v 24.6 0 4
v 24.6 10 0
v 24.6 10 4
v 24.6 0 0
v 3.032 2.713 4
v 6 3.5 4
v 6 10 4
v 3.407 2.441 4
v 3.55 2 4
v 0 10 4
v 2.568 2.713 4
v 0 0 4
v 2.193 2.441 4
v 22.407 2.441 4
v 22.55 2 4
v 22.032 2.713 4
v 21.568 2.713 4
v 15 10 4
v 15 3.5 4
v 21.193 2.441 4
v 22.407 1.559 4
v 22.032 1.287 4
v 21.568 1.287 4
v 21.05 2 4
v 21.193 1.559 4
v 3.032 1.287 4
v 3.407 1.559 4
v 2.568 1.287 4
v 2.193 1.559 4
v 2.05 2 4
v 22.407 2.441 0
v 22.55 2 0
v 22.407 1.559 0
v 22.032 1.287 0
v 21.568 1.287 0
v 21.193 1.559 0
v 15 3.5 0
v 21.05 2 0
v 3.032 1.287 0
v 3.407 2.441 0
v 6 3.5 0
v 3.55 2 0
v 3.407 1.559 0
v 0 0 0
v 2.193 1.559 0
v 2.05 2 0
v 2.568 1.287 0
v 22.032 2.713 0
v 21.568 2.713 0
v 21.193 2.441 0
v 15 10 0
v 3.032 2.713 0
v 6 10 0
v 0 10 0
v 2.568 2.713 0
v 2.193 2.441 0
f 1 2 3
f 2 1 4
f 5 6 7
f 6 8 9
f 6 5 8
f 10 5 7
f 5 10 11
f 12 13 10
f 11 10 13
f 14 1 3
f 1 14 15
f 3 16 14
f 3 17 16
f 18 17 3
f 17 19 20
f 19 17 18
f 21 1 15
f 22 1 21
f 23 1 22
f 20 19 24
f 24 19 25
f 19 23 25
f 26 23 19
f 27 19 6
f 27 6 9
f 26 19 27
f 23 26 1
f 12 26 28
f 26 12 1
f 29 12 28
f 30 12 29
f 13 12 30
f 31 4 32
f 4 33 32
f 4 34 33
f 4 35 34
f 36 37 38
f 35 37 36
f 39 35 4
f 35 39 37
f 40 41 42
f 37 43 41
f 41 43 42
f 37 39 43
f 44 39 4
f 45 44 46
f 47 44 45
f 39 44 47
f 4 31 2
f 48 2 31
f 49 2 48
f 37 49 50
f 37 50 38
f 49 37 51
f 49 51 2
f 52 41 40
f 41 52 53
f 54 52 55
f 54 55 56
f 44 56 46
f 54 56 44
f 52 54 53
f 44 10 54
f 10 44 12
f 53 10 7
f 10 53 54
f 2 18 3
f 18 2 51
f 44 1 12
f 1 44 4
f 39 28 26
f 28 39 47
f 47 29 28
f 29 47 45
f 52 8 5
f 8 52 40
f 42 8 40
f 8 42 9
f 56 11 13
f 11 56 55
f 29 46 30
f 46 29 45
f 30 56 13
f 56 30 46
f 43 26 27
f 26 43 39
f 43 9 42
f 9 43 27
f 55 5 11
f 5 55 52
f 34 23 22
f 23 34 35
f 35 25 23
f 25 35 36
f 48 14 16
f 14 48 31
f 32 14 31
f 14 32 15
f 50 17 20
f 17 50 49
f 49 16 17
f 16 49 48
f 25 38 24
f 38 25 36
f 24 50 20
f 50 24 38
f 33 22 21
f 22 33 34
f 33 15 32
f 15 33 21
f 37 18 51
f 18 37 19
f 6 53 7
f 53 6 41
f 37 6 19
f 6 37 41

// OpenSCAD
eps = 0.05;
eps2 = 2 * eps;
epsz = [0, 0, -eps];
$fa = 1;
$fs = 0.5;

x = 24.6;
y = 10;
h = 4;
sw_x = 6;
sw_w = 9;
sw_y = 3.5;
screw_distance = 19;
screw_d = 1.5;
screw_y = 2;

screw_x = (x - screw_distance) / 2;


difference() {
    cube([x, y, h]);
    translate([screw_x, screw_y, -eps]) cylinder(d=screw_d, h=h+eps2);
    translate([screw_x+screw_distance, screw_y, -eps]) cylinder(d=screw_d, h=h+eps2);

    translate([sw_x, sw_y, -eps])cube([sw_w, y, h+eps2]);

}
